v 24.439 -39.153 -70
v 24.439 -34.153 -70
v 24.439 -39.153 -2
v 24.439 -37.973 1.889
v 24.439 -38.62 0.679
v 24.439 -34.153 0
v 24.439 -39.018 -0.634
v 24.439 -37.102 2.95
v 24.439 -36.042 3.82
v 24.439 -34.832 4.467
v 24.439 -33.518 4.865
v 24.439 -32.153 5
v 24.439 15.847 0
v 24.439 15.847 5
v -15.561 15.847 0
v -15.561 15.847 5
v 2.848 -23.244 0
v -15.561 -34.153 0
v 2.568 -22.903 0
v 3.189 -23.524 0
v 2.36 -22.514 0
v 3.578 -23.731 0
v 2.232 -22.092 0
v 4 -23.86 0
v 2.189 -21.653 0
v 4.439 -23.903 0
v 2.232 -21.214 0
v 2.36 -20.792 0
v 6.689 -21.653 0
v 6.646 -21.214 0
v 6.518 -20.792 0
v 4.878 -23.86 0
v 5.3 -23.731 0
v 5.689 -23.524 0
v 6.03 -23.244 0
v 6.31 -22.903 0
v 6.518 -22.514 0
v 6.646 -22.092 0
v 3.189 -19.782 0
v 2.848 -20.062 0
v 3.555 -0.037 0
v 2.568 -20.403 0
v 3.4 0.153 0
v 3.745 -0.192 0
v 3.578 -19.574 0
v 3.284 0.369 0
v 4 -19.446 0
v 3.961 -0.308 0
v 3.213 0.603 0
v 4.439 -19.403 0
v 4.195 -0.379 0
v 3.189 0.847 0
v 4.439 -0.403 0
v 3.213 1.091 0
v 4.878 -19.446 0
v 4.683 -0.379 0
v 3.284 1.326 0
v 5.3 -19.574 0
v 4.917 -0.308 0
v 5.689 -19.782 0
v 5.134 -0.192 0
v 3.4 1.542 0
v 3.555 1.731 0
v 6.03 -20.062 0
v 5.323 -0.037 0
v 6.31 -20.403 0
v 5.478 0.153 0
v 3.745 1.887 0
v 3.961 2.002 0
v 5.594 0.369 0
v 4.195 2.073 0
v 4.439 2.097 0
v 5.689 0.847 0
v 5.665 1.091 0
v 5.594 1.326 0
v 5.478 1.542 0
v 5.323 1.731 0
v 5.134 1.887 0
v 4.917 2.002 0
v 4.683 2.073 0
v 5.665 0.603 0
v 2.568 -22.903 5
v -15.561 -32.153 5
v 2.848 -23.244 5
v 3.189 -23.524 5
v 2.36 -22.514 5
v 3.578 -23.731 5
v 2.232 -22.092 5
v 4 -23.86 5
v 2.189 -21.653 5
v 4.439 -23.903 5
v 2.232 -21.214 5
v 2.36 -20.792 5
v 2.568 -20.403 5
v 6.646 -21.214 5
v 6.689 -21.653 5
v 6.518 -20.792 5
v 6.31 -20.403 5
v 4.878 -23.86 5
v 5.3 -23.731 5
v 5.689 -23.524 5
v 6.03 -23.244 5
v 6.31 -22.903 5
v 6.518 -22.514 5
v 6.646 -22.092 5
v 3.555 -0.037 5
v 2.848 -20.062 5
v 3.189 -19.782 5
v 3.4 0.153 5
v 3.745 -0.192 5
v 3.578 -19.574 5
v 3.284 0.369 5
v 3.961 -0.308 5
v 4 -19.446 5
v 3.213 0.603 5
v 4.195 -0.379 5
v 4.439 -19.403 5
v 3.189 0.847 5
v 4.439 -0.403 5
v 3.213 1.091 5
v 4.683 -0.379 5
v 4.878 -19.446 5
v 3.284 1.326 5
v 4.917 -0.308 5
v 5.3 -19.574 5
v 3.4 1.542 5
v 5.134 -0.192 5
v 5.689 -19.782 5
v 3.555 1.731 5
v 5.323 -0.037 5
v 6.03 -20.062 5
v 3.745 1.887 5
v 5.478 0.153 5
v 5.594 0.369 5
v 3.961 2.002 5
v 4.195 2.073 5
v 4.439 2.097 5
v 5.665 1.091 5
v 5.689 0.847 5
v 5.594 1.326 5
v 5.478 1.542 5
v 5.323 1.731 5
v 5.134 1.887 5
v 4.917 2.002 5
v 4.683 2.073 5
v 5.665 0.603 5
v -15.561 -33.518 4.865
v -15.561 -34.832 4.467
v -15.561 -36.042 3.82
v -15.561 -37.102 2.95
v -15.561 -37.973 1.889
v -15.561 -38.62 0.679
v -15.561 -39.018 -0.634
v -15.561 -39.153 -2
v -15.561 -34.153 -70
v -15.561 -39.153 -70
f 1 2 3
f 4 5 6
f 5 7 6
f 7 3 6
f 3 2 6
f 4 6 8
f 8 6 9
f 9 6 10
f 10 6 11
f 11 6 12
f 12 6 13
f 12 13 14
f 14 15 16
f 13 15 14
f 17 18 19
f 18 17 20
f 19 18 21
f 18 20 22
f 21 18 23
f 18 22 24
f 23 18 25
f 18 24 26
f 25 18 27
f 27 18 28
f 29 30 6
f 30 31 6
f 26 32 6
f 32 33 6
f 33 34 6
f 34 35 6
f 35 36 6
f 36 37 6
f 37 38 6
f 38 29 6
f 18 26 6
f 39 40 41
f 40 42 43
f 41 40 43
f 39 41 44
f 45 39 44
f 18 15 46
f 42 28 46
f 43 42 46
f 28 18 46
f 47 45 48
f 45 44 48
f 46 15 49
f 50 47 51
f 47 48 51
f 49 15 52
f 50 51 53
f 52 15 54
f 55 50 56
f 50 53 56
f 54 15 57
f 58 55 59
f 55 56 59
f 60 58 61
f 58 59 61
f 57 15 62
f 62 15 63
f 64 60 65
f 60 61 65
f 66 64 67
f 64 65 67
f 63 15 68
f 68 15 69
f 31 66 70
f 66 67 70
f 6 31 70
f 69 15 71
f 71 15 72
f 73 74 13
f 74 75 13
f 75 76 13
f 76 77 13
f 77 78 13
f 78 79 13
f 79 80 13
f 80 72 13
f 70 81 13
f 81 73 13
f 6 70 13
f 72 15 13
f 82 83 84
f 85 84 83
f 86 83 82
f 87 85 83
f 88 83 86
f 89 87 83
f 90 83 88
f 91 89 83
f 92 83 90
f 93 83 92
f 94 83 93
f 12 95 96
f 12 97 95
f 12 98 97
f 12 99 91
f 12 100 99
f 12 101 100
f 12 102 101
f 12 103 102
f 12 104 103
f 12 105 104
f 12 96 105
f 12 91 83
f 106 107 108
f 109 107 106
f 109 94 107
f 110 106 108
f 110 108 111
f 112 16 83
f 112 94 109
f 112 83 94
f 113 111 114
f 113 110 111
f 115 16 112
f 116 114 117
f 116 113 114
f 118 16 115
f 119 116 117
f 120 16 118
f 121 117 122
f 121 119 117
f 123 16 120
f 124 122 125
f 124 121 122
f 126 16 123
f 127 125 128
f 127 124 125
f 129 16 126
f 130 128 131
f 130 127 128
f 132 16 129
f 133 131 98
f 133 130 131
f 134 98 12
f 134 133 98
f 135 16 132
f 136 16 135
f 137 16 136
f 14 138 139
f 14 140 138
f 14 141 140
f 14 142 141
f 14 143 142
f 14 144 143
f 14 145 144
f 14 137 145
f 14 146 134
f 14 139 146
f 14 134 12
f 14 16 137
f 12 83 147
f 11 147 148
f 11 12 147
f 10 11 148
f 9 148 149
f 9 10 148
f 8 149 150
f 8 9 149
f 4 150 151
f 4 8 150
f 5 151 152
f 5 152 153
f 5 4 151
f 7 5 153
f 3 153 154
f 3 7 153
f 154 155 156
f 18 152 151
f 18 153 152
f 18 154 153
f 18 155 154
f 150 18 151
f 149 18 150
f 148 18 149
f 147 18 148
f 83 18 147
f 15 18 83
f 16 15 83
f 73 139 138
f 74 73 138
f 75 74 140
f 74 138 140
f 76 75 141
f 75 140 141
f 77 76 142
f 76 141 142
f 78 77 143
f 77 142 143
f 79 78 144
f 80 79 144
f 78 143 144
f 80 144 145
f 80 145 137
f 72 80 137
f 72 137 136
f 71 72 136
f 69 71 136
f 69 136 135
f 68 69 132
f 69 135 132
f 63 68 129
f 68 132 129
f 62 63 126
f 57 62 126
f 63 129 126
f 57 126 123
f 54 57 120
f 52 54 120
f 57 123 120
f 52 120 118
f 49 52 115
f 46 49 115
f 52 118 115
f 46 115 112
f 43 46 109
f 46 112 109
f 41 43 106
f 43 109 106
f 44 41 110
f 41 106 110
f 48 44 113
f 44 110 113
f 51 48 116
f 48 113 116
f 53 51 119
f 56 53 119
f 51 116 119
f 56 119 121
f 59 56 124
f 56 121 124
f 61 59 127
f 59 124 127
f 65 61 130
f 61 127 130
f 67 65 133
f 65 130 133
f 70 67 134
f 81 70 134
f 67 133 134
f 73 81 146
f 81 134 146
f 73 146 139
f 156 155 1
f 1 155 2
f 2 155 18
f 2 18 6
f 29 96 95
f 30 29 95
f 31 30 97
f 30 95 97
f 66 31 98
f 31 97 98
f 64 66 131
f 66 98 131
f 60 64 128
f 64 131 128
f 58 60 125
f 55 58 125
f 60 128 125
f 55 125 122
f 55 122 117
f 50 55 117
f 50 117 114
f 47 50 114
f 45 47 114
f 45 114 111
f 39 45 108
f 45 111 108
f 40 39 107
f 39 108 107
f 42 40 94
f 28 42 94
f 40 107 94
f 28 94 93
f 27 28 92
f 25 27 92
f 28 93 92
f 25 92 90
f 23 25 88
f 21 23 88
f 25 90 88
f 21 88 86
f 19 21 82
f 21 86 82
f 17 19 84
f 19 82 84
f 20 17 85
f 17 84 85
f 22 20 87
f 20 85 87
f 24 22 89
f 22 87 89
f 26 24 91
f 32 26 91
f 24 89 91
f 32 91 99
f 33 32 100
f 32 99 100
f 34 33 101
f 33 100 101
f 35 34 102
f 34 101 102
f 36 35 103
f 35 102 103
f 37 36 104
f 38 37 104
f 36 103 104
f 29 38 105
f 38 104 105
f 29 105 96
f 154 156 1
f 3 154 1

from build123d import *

# Parameters (mm, degrees)
CROQUIS1_W              = 40
CROQUIS1_H              = 50
SALIENTE_EXTRUIR1_DEPTH = 5
CROQUIS2_R              = 1.25
CROQUIS2_R_2            = 2.25
CORTAR_EXTRUIR2_DEPTH   = 5
CROQUIS4_W              = 40
CROQUIS4_H              = 75
SALIENTE_EXTRUIR2_DEPTH = 5
REDONDEO1_R             = 7


with BuildPart() as part:
    # Croquis1 → Saliente-Extruir1 (new body)
    with BuildSketch(Plane.XY):
        with Locations((4.439140811, -9.15274463)):
            Rectangle(CROQUIS1_W, CROQUIS1_H)
    extrude(amount=SALIENTE_EXTRUIR1_DEPTH)

    # Croquis2 → Cortar-Extruir2 (cut)
    with BuildSketch(Plane.XY.offset(5)):
        with Locations((4.439140811, 0.84725537)):
            Circle(CROQUIS2_R)
        with Locations((4.439140811, -21.65274463)):
            Circle(CROQUIS2_R_2)
    extrude(amount=-CORTAR_EXTRUIR2_DEPTH, mode=Mode.SUBTRACT)

    # Croquis4 → Saliente-Extruir2 (add)
    with BuildSketch(Plane.XZ.offset(34.15274463)):
        with Locations((4.439140811, -32.5)):
            Rectangle(CROQUIS4_W, CROQUIS4_H)
    extrude(amount=SALIENTE_EXTRUIR2_DEPTH)

    # Redondeo1
    redondeo1_edges = [part.edges().sort_by_distance(p)[0] for p in [
        (4.439140811, -39.15274463, 5),
    ]]
    fillet(redondeo1_edges, radius=REDONDEO1_R)


solid = part.part
